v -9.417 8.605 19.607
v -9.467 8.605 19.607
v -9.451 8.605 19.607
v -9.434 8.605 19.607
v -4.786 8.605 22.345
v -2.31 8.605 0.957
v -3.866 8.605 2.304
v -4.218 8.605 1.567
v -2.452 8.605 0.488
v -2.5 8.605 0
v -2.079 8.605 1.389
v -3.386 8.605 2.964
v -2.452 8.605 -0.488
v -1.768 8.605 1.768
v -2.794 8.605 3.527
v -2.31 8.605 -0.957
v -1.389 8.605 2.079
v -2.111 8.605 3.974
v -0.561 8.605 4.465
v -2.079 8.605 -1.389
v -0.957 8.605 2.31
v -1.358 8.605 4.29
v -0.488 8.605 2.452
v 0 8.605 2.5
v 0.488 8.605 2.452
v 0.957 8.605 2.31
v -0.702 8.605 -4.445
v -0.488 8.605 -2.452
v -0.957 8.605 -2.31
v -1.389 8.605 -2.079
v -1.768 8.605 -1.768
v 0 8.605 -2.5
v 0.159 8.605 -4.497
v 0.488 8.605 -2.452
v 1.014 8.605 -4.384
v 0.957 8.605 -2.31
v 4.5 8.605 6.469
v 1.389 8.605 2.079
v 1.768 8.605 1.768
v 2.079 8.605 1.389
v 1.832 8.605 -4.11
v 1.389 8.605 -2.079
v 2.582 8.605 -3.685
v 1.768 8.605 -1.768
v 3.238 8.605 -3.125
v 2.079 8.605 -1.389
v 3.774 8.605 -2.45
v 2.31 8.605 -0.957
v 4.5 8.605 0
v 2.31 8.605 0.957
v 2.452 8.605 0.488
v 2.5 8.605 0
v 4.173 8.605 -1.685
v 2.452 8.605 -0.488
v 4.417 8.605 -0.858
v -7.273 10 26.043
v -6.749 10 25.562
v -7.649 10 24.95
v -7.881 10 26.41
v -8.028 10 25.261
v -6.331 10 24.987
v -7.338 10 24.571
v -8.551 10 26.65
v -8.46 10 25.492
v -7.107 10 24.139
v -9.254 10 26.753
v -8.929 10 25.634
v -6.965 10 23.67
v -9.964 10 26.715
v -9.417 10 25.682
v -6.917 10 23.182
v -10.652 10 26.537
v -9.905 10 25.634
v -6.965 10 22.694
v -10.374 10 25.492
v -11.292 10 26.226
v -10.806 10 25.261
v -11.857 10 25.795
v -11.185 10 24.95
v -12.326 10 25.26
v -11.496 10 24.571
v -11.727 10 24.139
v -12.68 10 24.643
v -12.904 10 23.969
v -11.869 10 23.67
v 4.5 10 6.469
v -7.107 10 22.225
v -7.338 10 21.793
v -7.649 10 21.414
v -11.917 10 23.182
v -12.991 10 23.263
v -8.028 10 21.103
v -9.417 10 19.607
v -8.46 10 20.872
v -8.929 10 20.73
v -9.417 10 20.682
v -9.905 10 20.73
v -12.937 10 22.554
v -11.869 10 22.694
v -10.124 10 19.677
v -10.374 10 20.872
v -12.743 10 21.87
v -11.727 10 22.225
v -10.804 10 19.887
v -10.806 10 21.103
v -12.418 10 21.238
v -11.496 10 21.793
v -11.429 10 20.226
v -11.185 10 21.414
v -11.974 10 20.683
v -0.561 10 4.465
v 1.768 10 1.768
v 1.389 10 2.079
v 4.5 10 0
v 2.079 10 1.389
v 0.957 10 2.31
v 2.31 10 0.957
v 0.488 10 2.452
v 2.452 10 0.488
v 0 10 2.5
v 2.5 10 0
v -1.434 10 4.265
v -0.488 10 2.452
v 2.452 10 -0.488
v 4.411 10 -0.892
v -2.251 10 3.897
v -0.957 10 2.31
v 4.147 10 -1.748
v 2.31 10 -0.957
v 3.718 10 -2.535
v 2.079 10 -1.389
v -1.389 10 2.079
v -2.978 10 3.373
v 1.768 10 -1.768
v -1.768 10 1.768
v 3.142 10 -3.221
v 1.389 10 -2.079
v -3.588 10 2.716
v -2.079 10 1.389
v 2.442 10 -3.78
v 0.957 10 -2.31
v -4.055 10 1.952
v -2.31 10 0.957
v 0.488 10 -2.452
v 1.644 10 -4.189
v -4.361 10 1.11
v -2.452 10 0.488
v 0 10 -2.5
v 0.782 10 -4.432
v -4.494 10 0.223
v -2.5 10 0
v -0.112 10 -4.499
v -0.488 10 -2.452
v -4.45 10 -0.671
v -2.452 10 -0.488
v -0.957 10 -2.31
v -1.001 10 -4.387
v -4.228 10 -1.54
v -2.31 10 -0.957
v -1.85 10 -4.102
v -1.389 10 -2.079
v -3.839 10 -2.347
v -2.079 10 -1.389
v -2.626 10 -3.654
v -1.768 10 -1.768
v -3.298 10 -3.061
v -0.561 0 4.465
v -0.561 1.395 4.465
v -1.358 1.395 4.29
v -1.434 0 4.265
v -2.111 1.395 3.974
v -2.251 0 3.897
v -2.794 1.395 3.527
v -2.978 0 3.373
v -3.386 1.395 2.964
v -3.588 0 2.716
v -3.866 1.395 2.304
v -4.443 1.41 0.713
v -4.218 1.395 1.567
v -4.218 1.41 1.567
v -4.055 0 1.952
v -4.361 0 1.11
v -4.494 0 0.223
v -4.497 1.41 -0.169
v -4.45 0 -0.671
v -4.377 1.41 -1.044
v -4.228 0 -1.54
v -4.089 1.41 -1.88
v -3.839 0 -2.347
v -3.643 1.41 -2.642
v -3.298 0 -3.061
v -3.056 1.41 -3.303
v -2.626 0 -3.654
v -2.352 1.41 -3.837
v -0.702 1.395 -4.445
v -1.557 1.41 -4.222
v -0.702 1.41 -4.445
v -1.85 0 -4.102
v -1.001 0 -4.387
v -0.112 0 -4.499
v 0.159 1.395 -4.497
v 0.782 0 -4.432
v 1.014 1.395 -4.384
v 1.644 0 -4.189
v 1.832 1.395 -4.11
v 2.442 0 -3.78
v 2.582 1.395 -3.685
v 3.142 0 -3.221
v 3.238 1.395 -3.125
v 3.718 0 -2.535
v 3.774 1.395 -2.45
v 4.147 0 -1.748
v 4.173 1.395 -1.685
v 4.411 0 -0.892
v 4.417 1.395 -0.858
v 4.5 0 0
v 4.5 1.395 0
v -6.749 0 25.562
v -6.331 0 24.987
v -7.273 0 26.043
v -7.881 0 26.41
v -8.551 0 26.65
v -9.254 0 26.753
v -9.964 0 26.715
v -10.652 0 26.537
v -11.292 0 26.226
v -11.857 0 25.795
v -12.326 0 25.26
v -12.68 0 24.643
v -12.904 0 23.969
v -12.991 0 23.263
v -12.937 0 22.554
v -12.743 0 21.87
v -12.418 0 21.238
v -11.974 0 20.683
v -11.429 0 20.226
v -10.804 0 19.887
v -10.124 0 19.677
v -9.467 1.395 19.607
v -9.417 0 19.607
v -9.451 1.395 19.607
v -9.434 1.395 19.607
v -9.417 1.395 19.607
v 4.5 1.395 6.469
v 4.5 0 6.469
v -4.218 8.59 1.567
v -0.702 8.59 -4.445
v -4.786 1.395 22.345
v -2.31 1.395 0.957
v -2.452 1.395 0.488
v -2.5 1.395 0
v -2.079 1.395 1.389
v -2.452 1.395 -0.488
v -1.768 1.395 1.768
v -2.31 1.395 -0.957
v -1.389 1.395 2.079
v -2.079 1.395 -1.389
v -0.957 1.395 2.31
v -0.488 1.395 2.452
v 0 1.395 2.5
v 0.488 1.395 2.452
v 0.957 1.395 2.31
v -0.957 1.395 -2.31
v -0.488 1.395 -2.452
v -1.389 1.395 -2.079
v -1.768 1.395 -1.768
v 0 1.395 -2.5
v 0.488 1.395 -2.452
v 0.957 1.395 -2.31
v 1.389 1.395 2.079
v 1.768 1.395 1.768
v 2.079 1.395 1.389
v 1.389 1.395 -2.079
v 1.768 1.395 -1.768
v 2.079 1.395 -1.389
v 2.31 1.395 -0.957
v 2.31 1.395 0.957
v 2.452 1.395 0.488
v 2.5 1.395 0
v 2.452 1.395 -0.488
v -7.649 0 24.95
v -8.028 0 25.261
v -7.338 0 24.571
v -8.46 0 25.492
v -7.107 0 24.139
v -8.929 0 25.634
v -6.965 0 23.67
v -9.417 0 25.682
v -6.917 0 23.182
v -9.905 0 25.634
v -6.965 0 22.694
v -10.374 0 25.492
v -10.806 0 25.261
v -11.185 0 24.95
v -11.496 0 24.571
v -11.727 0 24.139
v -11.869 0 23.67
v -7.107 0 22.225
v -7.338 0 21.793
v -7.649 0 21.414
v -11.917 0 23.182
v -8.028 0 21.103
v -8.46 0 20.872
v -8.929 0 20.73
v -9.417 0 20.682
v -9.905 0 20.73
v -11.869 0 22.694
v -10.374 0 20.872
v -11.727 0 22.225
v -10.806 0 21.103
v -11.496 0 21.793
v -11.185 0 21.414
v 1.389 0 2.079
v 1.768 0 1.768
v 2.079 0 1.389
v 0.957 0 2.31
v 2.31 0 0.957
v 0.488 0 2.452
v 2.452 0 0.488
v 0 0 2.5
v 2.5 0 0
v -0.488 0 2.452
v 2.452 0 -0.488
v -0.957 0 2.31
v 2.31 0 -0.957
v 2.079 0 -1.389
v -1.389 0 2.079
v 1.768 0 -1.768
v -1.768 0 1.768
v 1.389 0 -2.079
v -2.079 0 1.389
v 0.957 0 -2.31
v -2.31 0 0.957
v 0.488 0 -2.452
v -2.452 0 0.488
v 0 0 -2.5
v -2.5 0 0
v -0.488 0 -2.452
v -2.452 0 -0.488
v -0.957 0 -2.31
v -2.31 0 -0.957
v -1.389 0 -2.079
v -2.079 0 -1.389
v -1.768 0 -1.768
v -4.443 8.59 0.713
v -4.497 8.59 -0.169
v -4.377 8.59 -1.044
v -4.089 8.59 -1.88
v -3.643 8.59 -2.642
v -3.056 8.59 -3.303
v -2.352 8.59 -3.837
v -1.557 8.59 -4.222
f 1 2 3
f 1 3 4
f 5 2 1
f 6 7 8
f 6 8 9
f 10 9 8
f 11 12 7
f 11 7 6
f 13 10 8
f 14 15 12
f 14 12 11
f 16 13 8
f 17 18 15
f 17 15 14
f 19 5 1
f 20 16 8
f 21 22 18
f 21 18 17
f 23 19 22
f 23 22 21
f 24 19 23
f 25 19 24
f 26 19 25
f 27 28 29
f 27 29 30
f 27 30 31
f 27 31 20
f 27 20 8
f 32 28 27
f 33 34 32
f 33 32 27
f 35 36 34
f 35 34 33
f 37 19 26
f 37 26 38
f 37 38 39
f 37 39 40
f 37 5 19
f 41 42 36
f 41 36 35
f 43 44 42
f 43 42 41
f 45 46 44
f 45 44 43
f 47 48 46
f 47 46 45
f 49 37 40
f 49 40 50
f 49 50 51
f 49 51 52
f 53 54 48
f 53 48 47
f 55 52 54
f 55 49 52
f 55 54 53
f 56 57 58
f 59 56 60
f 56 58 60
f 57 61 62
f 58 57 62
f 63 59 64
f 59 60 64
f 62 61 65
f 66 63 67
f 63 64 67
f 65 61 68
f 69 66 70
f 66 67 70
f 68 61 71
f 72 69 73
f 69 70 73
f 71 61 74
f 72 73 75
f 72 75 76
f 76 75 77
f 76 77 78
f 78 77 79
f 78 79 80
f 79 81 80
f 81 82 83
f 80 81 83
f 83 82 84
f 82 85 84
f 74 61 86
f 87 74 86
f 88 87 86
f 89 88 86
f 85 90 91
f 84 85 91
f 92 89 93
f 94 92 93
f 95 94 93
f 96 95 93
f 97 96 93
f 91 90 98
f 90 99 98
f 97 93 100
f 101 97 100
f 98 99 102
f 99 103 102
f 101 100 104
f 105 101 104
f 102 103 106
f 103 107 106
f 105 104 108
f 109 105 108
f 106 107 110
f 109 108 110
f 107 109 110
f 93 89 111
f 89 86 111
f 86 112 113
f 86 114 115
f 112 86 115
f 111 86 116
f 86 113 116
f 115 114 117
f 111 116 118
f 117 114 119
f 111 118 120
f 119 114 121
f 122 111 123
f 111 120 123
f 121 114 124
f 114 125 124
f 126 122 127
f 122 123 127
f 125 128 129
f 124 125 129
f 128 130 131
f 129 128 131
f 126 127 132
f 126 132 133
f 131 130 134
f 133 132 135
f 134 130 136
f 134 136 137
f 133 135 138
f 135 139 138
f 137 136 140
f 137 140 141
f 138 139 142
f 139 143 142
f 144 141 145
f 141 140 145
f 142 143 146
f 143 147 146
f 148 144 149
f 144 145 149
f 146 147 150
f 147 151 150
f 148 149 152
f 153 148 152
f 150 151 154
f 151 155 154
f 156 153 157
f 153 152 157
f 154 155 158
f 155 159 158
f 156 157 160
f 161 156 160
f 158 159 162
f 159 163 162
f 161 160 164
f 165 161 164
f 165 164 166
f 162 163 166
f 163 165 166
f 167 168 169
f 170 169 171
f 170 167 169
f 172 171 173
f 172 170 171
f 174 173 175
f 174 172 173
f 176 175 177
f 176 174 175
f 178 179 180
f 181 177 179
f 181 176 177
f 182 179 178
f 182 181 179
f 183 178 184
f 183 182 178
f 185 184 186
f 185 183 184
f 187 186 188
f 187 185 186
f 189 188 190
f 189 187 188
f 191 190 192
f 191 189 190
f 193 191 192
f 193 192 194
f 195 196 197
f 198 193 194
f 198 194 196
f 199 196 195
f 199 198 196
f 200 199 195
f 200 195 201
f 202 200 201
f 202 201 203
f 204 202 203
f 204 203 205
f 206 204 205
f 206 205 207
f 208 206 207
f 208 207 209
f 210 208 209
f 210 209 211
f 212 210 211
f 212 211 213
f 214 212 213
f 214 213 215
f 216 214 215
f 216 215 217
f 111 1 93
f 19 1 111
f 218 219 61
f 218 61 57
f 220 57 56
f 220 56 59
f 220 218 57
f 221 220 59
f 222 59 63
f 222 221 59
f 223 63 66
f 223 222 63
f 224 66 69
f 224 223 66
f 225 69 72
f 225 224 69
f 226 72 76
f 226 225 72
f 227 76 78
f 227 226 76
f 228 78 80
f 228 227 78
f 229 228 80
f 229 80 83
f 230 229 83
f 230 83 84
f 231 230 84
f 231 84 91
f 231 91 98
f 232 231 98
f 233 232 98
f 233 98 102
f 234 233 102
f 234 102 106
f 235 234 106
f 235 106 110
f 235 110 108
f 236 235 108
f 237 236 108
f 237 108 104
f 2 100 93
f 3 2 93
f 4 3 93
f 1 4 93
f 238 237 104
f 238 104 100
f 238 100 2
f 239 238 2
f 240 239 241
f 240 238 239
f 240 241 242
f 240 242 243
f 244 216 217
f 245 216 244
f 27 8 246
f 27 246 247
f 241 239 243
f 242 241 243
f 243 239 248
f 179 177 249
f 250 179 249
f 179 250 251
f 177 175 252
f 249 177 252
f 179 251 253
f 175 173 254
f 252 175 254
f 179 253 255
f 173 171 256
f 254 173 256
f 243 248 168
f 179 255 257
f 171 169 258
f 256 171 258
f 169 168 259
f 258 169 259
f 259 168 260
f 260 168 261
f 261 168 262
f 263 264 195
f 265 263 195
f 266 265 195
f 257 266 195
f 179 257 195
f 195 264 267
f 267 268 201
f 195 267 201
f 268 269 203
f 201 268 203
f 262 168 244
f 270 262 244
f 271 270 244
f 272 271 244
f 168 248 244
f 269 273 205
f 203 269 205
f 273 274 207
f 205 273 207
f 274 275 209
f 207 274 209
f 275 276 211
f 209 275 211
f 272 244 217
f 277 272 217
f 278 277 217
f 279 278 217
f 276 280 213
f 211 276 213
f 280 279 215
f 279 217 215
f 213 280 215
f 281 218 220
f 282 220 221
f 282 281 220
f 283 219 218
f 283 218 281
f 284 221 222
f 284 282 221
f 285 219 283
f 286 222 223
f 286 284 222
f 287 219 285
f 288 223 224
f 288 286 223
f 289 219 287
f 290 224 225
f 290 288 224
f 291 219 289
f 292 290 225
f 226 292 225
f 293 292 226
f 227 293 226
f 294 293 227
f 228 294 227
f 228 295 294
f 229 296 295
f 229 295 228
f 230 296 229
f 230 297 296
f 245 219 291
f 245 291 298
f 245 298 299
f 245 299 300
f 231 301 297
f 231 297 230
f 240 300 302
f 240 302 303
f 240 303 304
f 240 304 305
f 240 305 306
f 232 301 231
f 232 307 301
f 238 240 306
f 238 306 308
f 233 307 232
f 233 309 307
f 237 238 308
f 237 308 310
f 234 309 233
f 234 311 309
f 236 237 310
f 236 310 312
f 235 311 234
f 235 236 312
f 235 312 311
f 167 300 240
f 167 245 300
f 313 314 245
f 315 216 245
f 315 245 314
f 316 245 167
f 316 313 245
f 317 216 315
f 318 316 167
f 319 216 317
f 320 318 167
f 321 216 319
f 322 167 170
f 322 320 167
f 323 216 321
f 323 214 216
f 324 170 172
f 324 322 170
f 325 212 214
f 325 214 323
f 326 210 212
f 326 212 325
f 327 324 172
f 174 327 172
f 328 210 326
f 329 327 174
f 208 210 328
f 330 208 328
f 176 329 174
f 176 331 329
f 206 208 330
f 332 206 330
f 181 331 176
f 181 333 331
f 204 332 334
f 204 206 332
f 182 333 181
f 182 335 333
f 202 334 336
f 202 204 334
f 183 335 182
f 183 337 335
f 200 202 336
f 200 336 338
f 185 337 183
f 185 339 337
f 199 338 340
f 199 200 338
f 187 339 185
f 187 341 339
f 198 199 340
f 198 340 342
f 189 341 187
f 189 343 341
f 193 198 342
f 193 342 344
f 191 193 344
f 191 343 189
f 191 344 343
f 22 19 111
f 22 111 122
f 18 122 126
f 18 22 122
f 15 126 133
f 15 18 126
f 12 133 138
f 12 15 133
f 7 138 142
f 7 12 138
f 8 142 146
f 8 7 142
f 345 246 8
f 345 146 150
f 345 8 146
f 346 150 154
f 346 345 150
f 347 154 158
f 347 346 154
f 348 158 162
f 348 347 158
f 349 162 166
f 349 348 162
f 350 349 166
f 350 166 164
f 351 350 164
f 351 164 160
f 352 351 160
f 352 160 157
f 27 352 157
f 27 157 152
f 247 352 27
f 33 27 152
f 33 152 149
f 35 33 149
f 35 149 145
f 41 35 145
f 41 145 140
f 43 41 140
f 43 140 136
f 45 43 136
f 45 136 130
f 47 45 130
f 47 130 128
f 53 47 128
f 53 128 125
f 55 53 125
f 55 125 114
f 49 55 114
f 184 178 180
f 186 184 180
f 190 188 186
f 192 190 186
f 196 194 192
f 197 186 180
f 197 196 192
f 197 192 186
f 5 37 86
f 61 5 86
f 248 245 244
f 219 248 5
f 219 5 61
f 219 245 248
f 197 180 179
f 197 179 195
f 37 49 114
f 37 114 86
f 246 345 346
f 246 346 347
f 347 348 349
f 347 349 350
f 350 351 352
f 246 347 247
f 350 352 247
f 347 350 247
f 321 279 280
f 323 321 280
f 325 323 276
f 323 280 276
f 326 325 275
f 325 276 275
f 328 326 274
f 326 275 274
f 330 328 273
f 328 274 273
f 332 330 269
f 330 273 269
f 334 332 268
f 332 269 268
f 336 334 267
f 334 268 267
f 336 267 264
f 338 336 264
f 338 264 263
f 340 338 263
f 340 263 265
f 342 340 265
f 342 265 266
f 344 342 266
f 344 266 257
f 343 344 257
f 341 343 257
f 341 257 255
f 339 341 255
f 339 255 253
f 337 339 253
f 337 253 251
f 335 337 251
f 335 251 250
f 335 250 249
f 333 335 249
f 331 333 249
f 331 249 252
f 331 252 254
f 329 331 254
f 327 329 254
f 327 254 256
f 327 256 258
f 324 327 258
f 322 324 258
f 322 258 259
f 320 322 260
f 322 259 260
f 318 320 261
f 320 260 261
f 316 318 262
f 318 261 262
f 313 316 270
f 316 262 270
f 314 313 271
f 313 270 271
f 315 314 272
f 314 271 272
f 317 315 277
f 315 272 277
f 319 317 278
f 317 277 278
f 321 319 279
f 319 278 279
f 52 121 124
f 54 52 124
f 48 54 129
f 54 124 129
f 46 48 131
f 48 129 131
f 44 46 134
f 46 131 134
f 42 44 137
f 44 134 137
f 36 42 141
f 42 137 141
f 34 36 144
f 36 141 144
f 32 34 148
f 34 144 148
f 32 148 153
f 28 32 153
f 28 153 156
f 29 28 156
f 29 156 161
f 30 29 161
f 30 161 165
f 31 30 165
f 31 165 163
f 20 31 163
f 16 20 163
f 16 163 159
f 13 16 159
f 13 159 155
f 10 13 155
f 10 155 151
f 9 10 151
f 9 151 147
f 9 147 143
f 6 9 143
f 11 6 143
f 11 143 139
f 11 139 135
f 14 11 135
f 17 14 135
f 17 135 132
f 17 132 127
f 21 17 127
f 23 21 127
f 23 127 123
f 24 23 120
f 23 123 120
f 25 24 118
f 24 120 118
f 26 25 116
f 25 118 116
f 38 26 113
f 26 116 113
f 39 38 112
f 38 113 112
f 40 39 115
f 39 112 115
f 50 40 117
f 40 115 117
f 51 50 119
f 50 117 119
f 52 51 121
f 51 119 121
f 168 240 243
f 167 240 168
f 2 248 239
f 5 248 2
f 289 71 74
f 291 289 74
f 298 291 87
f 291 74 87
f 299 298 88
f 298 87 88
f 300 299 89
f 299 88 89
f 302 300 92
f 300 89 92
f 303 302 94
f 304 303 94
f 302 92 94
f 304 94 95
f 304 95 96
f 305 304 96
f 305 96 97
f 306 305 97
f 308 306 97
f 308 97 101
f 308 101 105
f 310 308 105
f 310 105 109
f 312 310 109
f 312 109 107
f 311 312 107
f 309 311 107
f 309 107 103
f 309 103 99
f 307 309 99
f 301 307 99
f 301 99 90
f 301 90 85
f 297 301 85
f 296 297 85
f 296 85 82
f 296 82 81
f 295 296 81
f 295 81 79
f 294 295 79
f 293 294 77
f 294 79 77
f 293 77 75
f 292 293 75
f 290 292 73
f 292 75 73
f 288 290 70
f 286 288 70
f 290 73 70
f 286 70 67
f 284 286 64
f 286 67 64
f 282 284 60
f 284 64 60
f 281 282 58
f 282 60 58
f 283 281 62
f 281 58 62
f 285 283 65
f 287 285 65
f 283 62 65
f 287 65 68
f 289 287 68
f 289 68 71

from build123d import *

# Parameters (mm, degrees)
BOSS_EXTRUDE1_DEPTH     = 10
SKETCH2_W               = 18
SKETCH2_H               = 7.18
CUT_EXTRUDE1_DEPTH      = 4.5
CUT_EXTRUDE1_DEPTH_BACK = 10
SKETCH3_R               = 2.5
CUT_EXTRUDE2_DEPTH      = 11
SKETCH4_R               = 2.5
CUT_EXTRUDE3_DEPTH      = 11
SKETCH5_W               = 40.184042348
SKETCH5_H               = 7.210208874
CUT_EXTRUDE4_DEPTH      = 10


with BuildPart() as part:
    # Sketch1 → Boss-Extrude1 (new body)
    with BuildSketch(Plane(origin=(0, 0, 0), x_dir=(1, 0, 0), z_dir=(0, 1, 0))):
        with BuildLine():
            Line((4.5, 0), (4.5, -6.46875))
            Line((4.5, -6.46875), (-6.330925138, -24.986801467))
            ThreePointArc((-6.330925138, -24.986801467), (-12.518133398, -24.960664715), (-9.416959682, -19.606698823))
            Line((-9.416959682, -19.606698823), (-0.560766754, -4.464923364))
            ThreePointArc((-0.560766754, -4.464923364), (-2.977125258, 3.374422202), (4.5, 0))
        make_face()
    extrude(amount=BOSS_EXTRUDE1_DEPTH)

    # Sketch2 → Cut-Extrude1 (cut, two sides)
    with BuildSketch(Plane.XY) as cut_extrude1_sk:
        with Locations((4.5, 5)):
            Rectangle(SKETCH2_W, SKETCH2_H)
    extrude(amount=CUT_EXTRUDE1_DEPTH, mode=Mode.SUBTRACT)
    extrude(cut_extrude1_sk.sketch, amount=-CUT_EXTRUDE1_DEPTH_BACK, mode=Mode.SUBTRACT)

    # Sketch3 → Cut-Extrude2 (cut, through all)
    with BuildSketch(Plane(origin=(0, 10, 0), x_dir=(1, 0, 0), z_dir=(0, 1, 0))):
        Circle(SKETCH3_R)
    extrude(amount=-CUT_EXTRUDE2_DEPTH, mode=Mode.SUBTRACT)

    # Sketch4 → Cut-Extrude3 (cut, through all)
    with BuildSketch(Plane(origin=(0, 10, 0), x_dir=(1, 0, 0), z_dir=(0, 1, 0))):
        with Locations((-9.416959682, -23.181827052)):
            Circle(SKETCH4_R)
    extrude(amount=-CUT_EXTRUDE3_DEPTH, mode=Mode.SUBTRACT)

    # Sketch5 → Cut-Extrude4 (cut)
    with BuildSketch(Plane(origin=(6.172069089, 0, 3.609948831), x_dir=(0.50486984, 0, -0.863195485), z_dir=(0.863195485, 0, 0.50486984))):
        with Locations((-1.612465403, 5)):
            Rectangle(SKETCH5_W, SKETCH5_H)
    extrude(amount=-CUT_EXTRUDE4_DEPTH, mode=Mode.SUBTRACT)


solid = part.part
